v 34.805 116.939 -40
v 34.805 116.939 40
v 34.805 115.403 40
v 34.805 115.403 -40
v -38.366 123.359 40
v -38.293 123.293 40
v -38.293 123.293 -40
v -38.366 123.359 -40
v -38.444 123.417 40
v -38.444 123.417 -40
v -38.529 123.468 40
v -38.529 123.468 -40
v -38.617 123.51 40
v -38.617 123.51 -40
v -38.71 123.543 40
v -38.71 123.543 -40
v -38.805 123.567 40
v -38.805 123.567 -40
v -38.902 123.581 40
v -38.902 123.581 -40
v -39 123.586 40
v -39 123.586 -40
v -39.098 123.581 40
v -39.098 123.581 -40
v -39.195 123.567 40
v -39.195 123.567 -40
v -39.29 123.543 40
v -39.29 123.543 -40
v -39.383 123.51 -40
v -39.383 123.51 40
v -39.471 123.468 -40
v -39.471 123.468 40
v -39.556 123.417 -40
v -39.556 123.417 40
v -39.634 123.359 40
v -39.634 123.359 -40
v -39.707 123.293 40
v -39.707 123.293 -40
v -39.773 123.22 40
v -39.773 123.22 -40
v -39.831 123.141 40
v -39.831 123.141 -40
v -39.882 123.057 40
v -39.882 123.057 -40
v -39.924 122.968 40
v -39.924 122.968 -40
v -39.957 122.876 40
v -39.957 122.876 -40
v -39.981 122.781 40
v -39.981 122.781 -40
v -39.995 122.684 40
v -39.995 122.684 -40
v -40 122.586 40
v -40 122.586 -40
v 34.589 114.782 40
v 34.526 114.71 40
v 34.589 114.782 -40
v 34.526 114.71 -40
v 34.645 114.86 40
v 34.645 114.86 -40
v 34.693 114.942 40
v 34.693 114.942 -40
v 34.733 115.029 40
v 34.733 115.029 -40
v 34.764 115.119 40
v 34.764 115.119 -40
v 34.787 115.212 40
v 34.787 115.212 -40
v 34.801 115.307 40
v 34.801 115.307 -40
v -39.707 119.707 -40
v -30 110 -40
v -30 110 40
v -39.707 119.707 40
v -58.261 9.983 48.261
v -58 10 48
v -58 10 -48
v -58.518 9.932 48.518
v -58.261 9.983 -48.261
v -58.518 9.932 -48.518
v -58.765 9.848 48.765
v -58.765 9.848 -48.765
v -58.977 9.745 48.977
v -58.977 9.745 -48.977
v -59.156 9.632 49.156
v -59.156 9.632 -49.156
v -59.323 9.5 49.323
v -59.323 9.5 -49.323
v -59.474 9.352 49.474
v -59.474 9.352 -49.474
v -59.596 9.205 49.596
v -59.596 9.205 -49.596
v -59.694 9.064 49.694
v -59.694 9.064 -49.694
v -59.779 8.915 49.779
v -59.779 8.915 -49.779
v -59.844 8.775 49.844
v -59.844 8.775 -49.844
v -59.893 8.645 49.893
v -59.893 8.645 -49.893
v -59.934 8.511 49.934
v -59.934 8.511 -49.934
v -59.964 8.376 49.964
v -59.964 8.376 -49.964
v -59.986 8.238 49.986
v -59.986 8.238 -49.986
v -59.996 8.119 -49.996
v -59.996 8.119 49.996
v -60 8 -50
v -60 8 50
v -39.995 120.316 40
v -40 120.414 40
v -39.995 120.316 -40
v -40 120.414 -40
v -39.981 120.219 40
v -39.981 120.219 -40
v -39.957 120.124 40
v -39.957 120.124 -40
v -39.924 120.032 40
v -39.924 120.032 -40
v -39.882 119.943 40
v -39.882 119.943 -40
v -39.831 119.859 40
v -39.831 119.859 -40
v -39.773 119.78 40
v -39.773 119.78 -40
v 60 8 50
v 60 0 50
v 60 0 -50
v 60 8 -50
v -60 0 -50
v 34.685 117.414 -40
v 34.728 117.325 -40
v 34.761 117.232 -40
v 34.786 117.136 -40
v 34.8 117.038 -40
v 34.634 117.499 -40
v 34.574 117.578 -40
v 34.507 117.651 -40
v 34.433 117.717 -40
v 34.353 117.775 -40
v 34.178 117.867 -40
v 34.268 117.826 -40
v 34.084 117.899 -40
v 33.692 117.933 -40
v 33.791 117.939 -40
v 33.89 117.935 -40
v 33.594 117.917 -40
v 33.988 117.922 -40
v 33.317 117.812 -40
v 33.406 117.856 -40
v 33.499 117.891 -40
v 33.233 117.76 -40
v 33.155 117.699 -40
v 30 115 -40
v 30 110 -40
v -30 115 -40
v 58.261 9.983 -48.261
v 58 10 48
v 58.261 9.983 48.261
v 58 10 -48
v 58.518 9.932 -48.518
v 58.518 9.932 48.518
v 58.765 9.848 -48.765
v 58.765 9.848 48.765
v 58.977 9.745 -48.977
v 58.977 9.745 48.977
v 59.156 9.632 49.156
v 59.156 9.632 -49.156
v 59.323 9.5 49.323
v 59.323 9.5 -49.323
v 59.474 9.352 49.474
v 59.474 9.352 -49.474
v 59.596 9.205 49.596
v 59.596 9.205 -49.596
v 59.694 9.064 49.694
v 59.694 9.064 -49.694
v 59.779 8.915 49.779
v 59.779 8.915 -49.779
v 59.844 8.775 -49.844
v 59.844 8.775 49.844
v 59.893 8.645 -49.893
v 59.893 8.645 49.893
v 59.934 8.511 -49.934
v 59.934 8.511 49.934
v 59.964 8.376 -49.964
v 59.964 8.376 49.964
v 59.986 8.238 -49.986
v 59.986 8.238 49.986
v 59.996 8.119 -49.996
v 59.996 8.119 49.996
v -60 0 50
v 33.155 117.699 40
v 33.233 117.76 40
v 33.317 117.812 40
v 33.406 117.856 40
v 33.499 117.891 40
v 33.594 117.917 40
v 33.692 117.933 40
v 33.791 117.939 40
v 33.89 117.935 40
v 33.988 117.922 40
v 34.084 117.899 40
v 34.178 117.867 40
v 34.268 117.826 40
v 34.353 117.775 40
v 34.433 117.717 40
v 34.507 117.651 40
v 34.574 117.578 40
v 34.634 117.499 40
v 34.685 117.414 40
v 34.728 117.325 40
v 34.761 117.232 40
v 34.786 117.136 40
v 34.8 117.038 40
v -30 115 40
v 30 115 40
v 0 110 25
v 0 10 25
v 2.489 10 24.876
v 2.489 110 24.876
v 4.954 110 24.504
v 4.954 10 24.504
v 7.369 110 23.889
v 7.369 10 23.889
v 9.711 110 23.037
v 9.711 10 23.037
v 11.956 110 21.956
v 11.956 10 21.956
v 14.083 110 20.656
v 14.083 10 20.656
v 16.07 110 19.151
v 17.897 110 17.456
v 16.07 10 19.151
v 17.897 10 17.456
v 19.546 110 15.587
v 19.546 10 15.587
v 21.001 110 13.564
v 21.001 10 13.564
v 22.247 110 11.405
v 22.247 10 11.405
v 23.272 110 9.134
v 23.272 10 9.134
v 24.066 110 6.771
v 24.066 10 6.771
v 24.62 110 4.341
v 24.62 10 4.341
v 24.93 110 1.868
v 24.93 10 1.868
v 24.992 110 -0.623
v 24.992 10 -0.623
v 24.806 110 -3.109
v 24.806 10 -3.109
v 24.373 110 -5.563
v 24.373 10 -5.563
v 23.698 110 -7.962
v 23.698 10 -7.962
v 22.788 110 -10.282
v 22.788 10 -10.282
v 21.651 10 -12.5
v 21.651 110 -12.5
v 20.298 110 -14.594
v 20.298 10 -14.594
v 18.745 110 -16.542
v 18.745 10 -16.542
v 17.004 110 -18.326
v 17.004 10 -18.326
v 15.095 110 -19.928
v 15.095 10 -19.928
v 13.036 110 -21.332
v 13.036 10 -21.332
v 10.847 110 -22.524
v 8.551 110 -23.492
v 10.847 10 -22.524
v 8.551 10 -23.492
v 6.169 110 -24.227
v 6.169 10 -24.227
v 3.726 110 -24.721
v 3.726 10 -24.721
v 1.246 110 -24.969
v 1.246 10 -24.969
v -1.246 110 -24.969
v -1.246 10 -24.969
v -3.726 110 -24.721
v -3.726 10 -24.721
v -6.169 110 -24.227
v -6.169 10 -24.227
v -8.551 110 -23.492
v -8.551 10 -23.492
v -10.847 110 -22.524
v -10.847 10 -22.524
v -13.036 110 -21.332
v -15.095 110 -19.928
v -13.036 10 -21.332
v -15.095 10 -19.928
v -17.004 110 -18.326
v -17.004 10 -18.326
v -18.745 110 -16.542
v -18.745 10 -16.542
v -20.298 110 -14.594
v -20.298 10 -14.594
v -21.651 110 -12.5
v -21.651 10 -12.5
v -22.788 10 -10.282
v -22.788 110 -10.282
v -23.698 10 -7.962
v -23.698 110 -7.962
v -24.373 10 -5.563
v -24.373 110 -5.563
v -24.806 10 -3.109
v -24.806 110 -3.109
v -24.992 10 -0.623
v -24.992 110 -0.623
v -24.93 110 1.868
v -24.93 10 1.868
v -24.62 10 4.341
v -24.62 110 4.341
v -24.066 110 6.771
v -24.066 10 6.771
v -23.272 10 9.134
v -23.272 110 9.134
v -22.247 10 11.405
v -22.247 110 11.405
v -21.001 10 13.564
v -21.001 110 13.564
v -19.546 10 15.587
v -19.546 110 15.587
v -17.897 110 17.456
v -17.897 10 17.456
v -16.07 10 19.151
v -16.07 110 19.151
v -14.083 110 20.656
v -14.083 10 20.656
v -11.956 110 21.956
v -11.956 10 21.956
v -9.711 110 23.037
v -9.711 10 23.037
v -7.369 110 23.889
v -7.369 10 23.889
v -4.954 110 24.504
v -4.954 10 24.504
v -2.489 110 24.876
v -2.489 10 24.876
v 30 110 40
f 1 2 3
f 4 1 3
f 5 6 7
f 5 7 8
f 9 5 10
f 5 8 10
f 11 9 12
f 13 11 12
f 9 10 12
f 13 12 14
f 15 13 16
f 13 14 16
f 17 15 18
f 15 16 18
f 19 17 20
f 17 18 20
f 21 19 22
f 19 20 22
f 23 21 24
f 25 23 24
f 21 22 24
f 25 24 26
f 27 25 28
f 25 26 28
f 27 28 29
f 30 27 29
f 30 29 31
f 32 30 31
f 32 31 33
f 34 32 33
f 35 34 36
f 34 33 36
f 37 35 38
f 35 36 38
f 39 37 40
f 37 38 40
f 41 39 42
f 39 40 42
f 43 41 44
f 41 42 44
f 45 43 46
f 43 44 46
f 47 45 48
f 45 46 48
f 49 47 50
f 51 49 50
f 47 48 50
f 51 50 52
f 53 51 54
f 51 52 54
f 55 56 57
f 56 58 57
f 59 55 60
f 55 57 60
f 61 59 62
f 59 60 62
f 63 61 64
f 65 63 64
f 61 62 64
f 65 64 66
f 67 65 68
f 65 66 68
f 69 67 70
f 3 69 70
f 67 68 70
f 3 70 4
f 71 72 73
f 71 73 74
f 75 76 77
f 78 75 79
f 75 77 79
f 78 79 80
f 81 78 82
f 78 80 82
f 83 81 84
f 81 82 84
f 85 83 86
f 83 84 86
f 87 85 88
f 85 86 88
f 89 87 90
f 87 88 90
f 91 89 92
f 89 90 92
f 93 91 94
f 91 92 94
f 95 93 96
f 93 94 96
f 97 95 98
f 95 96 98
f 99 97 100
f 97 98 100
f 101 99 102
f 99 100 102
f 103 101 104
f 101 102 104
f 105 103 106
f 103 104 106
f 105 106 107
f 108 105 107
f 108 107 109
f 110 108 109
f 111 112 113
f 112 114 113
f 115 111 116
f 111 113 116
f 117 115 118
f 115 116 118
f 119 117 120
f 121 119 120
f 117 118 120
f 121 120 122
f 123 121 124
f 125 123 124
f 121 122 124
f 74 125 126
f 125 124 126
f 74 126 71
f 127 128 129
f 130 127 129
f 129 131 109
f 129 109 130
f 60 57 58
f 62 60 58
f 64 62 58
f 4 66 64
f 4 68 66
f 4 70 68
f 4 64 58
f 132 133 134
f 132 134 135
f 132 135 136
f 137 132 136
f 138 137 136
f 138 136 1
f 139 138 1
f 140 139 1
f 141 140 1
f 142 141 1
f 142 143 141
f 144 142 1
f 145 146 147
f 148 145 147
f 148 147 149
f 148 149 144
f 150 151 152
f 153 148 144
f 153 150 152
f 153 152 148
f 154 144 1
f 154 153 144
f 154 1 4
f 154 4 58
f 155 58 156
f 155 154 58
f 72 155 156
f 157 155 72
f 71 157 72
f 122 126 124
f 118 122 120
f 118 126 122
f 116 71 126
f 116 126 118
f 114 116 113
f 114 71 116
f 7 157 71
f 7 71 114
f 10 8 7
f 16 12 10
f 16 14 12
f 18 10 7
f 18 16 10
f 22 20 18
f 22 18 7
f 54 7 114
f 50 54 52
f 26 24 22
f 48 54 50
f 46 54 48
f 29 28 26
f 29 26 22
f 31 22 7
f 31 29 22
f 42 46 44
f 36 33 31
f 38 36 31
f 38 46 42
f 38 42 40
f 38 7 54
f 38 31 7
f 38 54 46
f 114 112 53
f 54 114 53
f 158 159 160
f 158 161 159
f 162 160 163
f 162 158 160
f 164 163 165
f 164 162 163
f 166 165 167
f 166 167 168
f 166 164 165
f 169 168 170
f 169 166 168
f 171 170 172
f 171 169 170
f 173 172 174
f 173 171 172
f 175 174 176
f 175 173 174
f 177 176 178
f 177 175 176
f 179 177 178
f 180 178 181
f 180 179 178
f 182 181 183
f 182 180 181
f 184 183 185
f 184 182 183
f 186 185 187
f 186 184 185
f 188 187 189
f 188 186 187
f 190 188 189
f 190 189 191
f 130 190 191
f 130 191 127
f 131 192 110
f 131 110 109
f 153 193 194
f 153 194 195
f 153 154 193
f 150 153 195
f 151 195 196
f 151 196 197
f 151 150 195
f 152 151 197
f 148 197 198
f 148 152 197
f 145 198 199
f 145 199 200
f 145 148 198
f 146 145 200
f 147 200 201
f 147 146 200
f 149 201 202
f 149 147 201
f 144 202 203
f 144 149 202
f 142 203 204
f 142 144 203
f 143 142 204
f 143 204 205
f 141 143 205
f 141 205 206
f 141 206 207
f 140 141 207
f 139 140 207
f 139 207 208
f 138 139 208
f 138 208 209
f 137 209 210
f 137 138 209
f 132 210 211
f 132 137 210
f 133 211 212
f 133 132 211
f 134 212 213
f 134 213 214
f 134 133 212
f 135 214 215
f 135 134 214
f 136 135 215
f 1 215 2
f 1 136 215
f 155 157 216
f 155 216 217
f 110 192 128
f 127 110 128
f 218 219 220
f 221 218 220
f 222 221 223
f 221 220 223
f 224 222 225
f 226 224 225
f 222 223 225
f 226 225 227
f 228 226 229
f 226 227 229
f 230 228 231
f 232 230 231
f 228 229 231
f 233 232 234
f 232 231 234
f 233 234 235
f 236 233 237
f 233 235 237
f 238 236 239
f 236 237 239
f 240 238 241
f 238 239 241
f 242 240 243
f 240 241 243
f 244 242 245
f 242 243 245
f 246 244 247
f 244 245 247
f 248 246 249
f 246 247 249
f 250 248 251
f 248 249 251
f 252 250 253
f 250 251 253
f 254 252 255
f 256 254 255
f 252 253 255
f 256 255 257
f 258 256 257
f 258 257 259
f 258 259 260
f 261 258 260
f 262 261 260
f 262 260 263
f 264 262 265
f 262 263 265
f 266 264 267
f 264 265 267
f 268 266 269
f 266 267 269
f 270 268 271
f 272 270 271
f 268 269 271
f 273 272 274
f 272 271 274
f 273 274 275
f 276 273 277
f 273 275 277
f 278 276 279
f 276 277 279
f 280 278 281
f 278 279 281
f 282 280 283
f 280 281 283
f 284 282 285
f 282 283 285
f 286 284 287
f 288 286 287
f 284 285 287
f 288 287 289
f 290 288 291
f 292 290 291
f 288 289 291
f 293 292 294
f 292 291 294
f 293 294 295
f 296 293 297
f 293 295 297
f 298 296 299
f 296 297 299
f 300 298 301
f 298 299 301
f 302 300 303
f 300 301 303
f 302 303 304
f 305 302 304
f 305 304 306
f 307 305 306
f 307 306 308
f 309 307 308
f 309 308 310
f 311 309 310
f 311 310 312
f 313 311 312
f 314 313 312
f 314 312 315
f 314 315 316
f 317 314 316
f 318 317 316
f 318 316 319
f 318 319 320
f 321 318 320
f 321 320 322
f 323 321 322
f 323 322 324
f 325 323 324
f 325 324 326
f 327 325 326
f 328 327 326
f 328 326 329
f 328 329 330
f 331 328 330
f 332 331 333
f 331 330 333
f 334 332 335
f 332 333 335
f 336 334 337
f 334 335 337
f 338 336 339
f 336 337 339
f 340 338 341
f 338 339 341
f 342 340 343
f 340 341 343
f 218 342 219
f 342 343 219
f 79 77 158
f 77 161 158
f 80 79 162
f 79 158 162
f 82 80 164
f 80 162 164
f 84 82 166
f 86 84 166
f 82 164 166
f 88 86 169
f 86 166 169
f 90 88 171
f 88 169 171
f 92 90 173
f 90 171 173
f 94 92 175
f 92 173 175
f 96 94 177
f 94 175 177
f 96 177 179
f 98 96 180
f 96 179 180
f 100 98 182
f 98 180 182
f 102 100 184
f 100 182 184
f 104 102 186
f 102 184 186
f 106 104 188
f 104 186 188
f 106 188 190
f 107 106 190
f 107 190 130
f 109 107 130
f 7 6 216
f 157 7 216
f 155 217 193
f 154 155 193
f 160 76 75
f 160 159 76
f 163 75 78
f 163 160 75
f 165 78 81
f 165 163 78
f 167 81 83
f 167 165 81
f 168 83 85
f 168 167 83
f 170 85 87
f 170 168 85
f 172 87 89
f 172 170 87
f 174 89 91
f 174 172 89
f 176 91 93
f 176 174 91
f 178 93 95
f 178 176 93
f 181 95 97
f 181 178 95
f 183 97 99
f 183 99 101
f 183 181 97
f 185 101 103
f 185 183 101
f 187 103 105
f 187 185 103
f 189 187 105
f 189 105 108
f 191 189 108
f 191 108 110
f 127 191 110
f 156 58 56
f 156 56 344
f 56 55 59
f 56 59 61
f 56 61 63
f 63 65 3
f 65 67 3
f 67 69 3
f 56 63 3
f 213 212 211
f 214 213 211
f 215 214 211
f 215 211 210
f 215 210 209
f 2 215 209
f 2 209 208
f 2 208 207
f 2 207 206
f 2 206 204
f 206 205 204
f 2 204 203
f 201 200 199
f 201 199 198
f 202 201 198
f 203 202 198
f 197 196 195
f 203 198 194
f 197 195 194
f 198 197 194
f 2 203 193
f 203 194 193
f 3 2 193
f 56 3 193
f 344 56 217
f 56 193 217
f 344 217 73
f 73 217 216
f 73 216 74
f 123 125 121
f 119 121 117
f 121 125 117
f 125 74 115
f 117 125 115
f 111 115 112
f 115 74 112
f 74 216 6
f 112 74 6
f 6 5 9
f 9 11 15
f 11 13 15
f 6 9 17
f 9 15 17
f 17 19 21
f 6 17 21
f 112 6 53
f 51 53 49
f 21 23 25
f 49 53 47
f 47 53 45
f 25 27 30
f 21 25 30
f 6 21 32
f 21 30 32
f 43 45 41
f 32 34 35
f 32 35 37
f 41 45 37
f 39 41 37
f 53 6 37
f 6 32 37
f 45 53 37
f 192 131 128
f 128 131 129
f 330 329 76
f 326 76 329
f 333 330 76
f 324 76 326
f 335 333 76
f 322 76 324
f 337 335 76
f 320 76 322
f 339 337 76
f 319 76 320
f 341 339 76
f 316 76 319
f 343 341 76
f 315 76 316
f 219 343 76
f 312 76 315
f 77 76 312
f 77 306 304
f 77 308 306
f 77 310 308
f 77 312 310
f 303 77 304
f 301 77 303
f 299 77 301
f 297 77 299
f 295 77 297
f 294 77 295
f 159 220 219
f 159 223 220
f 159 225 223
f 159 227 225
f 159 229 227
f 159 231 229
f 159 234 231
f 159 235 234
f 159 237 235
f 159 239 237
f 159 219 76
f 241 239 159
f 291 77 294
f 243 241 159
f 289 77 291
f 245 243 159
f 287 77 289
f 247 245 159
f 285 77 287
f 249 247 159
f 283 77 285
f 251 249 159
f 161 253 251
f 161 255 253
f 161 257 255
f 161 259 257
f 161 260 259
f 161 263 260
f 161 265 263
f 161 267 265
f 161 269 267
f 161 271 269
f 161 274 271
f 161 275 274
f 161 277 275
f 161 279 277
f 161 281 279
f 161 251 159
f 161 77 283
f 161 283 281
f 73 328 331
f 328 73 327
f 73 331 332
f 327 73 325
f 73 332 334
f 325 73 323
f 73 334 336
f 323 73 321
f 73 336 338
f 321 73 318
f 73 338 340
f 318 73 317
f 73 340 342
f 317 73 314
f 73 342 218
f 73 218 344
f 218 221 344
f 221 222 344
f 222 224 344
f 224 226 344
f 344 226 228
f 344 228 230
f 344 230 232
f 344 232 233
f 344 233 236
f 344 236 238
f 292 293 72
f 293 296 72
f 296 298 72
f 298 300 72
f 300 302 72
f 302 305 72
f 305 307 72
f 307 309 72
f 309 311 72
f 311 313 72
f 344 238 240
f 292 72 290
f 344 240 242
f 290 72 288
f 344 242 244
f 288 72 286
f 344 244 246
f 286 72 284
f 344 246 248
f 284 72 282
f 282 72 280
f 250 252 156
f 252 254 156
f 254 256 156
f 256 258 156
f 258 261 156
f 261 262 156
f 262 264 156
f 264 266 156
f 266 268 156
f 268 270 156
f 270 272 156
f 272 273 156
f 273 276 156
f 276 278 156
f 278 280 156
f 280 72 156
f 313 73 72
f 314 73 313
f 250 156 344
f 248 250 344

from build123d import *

# Parameters (mm, degrees)
SKETCH_1_W      = 120
SKETCH_1_H      = 100
EXTRUDE_1_DEPTH = 10
SKETCH_2_R      = 25
EXTRUDE_2_DEPTH = 100
SKETCH_3_W      = 60
SKETCH_3_H      = 80
EXTRUDE_3_DEPTH = 5
EXTRUDE_4_DEPTH = 80
EXTRUDE_5_DEPTH = 80
FILLET_2_R      = 1
FILLET_3_R      = 1
FILLET_4_R      = 1
FILLET_5_R      = 1
FILLET_6_R      = 2


with BuildPart() as part:
    # 草图1 → 凸台-拉伸1 (new body)
    with BuildSketch(Plane(origin=(0, 0, 0), x_dir=(1, 0, 0), z_dir=(0, 1, 0))):
        Rectangle(SKETCH_1_W, SKETCH_1_H)
    extrude(amount=EXTRUDE_1_DEPTH)

    # 草图2 → 凸台-拉伸2 (add)
    with BuildSketch(Plane(origin=(0, 10, 0), x_dir=(1, 0, 0), z_dir=(0, 1, 0))):
        with Locations(Location((0, 0, 0), (0, 0, 270))):
            Circle(SKETCH_2_R)
    extrude(amount=EXTRUDE_2_DEPTH)

    # 草图3 → 凸台-拉伸3 (add)
    with BuildSketch(Plane(origin=(0, 110, 0), x_dir=(1, 0, 0), z_dir=(0, 1, 0))):
        Rectangle(SKETCH_3_W, SKETCH_3_H)
    extrude(amount=EXTRUDE_3_DEPTH)

    # 草图5 → 凸台-拉伸4 (add)
    with BuildSketch(Plane.XY.offset(40)):
        Polygon((-40, 125), (-30, 115), (-30, 110), (-40, 120), align=None)
    extrude(amount=-EXTRUDE_4_DEPTH)

    # 草图6 → 凸台-拉伸5 (add)
    with BuildSketch(Plane.XY.offset(40)):
        Polygon((30, 115), (34.805168411, 119.110453023), (34.805168411, 115), (30, 110), align=None)
    extrude(amount=-EXTRUDE_5_DEPTH)

    # 圆角2
    fillet_2_edges = [part.edges().sort_by_distance(p)[0] for p in [
        (-40, 125, 0),
    ]]
    fillet(fillet_2_edges, radius=FILLET_2_R)

    # 圆角3
    fillet_3_edges = [part.edges().sort_by_distance(p)[0] for p in [
        (34.805168411, 119.110453023, 0),
    ]]
    fillet(fillet_3_edges, radius=FILLET_3_R)

    # 圆角4
    fillet_4_edges = [part.edges().sort_by_distance(p)[0] for p in [
        (-40, 120, 0),
    ]]
    fillet(fillet_4_edges, radius=FILLET_4_R)

    # 圆角5
    fillet_5_edges = [part.edges().sort_by_distance(p)[0] for p in [
        (34.805168411, 115, 0),
    ]]
    fillet(fillet_5_edges, radius=FILLET_5_R)

    # 圆角6
    fillet_6_edges = [part.edges().sort_by_distance(p)[0] for p in [
        (-60, 10, 0),
        (0, 10, 50),
        (60, 10, 0),
        (0, 10, -50),
    ]]
    fillet(fillet_6_edges, radius=FILLET_6_R)


solid = part.part
